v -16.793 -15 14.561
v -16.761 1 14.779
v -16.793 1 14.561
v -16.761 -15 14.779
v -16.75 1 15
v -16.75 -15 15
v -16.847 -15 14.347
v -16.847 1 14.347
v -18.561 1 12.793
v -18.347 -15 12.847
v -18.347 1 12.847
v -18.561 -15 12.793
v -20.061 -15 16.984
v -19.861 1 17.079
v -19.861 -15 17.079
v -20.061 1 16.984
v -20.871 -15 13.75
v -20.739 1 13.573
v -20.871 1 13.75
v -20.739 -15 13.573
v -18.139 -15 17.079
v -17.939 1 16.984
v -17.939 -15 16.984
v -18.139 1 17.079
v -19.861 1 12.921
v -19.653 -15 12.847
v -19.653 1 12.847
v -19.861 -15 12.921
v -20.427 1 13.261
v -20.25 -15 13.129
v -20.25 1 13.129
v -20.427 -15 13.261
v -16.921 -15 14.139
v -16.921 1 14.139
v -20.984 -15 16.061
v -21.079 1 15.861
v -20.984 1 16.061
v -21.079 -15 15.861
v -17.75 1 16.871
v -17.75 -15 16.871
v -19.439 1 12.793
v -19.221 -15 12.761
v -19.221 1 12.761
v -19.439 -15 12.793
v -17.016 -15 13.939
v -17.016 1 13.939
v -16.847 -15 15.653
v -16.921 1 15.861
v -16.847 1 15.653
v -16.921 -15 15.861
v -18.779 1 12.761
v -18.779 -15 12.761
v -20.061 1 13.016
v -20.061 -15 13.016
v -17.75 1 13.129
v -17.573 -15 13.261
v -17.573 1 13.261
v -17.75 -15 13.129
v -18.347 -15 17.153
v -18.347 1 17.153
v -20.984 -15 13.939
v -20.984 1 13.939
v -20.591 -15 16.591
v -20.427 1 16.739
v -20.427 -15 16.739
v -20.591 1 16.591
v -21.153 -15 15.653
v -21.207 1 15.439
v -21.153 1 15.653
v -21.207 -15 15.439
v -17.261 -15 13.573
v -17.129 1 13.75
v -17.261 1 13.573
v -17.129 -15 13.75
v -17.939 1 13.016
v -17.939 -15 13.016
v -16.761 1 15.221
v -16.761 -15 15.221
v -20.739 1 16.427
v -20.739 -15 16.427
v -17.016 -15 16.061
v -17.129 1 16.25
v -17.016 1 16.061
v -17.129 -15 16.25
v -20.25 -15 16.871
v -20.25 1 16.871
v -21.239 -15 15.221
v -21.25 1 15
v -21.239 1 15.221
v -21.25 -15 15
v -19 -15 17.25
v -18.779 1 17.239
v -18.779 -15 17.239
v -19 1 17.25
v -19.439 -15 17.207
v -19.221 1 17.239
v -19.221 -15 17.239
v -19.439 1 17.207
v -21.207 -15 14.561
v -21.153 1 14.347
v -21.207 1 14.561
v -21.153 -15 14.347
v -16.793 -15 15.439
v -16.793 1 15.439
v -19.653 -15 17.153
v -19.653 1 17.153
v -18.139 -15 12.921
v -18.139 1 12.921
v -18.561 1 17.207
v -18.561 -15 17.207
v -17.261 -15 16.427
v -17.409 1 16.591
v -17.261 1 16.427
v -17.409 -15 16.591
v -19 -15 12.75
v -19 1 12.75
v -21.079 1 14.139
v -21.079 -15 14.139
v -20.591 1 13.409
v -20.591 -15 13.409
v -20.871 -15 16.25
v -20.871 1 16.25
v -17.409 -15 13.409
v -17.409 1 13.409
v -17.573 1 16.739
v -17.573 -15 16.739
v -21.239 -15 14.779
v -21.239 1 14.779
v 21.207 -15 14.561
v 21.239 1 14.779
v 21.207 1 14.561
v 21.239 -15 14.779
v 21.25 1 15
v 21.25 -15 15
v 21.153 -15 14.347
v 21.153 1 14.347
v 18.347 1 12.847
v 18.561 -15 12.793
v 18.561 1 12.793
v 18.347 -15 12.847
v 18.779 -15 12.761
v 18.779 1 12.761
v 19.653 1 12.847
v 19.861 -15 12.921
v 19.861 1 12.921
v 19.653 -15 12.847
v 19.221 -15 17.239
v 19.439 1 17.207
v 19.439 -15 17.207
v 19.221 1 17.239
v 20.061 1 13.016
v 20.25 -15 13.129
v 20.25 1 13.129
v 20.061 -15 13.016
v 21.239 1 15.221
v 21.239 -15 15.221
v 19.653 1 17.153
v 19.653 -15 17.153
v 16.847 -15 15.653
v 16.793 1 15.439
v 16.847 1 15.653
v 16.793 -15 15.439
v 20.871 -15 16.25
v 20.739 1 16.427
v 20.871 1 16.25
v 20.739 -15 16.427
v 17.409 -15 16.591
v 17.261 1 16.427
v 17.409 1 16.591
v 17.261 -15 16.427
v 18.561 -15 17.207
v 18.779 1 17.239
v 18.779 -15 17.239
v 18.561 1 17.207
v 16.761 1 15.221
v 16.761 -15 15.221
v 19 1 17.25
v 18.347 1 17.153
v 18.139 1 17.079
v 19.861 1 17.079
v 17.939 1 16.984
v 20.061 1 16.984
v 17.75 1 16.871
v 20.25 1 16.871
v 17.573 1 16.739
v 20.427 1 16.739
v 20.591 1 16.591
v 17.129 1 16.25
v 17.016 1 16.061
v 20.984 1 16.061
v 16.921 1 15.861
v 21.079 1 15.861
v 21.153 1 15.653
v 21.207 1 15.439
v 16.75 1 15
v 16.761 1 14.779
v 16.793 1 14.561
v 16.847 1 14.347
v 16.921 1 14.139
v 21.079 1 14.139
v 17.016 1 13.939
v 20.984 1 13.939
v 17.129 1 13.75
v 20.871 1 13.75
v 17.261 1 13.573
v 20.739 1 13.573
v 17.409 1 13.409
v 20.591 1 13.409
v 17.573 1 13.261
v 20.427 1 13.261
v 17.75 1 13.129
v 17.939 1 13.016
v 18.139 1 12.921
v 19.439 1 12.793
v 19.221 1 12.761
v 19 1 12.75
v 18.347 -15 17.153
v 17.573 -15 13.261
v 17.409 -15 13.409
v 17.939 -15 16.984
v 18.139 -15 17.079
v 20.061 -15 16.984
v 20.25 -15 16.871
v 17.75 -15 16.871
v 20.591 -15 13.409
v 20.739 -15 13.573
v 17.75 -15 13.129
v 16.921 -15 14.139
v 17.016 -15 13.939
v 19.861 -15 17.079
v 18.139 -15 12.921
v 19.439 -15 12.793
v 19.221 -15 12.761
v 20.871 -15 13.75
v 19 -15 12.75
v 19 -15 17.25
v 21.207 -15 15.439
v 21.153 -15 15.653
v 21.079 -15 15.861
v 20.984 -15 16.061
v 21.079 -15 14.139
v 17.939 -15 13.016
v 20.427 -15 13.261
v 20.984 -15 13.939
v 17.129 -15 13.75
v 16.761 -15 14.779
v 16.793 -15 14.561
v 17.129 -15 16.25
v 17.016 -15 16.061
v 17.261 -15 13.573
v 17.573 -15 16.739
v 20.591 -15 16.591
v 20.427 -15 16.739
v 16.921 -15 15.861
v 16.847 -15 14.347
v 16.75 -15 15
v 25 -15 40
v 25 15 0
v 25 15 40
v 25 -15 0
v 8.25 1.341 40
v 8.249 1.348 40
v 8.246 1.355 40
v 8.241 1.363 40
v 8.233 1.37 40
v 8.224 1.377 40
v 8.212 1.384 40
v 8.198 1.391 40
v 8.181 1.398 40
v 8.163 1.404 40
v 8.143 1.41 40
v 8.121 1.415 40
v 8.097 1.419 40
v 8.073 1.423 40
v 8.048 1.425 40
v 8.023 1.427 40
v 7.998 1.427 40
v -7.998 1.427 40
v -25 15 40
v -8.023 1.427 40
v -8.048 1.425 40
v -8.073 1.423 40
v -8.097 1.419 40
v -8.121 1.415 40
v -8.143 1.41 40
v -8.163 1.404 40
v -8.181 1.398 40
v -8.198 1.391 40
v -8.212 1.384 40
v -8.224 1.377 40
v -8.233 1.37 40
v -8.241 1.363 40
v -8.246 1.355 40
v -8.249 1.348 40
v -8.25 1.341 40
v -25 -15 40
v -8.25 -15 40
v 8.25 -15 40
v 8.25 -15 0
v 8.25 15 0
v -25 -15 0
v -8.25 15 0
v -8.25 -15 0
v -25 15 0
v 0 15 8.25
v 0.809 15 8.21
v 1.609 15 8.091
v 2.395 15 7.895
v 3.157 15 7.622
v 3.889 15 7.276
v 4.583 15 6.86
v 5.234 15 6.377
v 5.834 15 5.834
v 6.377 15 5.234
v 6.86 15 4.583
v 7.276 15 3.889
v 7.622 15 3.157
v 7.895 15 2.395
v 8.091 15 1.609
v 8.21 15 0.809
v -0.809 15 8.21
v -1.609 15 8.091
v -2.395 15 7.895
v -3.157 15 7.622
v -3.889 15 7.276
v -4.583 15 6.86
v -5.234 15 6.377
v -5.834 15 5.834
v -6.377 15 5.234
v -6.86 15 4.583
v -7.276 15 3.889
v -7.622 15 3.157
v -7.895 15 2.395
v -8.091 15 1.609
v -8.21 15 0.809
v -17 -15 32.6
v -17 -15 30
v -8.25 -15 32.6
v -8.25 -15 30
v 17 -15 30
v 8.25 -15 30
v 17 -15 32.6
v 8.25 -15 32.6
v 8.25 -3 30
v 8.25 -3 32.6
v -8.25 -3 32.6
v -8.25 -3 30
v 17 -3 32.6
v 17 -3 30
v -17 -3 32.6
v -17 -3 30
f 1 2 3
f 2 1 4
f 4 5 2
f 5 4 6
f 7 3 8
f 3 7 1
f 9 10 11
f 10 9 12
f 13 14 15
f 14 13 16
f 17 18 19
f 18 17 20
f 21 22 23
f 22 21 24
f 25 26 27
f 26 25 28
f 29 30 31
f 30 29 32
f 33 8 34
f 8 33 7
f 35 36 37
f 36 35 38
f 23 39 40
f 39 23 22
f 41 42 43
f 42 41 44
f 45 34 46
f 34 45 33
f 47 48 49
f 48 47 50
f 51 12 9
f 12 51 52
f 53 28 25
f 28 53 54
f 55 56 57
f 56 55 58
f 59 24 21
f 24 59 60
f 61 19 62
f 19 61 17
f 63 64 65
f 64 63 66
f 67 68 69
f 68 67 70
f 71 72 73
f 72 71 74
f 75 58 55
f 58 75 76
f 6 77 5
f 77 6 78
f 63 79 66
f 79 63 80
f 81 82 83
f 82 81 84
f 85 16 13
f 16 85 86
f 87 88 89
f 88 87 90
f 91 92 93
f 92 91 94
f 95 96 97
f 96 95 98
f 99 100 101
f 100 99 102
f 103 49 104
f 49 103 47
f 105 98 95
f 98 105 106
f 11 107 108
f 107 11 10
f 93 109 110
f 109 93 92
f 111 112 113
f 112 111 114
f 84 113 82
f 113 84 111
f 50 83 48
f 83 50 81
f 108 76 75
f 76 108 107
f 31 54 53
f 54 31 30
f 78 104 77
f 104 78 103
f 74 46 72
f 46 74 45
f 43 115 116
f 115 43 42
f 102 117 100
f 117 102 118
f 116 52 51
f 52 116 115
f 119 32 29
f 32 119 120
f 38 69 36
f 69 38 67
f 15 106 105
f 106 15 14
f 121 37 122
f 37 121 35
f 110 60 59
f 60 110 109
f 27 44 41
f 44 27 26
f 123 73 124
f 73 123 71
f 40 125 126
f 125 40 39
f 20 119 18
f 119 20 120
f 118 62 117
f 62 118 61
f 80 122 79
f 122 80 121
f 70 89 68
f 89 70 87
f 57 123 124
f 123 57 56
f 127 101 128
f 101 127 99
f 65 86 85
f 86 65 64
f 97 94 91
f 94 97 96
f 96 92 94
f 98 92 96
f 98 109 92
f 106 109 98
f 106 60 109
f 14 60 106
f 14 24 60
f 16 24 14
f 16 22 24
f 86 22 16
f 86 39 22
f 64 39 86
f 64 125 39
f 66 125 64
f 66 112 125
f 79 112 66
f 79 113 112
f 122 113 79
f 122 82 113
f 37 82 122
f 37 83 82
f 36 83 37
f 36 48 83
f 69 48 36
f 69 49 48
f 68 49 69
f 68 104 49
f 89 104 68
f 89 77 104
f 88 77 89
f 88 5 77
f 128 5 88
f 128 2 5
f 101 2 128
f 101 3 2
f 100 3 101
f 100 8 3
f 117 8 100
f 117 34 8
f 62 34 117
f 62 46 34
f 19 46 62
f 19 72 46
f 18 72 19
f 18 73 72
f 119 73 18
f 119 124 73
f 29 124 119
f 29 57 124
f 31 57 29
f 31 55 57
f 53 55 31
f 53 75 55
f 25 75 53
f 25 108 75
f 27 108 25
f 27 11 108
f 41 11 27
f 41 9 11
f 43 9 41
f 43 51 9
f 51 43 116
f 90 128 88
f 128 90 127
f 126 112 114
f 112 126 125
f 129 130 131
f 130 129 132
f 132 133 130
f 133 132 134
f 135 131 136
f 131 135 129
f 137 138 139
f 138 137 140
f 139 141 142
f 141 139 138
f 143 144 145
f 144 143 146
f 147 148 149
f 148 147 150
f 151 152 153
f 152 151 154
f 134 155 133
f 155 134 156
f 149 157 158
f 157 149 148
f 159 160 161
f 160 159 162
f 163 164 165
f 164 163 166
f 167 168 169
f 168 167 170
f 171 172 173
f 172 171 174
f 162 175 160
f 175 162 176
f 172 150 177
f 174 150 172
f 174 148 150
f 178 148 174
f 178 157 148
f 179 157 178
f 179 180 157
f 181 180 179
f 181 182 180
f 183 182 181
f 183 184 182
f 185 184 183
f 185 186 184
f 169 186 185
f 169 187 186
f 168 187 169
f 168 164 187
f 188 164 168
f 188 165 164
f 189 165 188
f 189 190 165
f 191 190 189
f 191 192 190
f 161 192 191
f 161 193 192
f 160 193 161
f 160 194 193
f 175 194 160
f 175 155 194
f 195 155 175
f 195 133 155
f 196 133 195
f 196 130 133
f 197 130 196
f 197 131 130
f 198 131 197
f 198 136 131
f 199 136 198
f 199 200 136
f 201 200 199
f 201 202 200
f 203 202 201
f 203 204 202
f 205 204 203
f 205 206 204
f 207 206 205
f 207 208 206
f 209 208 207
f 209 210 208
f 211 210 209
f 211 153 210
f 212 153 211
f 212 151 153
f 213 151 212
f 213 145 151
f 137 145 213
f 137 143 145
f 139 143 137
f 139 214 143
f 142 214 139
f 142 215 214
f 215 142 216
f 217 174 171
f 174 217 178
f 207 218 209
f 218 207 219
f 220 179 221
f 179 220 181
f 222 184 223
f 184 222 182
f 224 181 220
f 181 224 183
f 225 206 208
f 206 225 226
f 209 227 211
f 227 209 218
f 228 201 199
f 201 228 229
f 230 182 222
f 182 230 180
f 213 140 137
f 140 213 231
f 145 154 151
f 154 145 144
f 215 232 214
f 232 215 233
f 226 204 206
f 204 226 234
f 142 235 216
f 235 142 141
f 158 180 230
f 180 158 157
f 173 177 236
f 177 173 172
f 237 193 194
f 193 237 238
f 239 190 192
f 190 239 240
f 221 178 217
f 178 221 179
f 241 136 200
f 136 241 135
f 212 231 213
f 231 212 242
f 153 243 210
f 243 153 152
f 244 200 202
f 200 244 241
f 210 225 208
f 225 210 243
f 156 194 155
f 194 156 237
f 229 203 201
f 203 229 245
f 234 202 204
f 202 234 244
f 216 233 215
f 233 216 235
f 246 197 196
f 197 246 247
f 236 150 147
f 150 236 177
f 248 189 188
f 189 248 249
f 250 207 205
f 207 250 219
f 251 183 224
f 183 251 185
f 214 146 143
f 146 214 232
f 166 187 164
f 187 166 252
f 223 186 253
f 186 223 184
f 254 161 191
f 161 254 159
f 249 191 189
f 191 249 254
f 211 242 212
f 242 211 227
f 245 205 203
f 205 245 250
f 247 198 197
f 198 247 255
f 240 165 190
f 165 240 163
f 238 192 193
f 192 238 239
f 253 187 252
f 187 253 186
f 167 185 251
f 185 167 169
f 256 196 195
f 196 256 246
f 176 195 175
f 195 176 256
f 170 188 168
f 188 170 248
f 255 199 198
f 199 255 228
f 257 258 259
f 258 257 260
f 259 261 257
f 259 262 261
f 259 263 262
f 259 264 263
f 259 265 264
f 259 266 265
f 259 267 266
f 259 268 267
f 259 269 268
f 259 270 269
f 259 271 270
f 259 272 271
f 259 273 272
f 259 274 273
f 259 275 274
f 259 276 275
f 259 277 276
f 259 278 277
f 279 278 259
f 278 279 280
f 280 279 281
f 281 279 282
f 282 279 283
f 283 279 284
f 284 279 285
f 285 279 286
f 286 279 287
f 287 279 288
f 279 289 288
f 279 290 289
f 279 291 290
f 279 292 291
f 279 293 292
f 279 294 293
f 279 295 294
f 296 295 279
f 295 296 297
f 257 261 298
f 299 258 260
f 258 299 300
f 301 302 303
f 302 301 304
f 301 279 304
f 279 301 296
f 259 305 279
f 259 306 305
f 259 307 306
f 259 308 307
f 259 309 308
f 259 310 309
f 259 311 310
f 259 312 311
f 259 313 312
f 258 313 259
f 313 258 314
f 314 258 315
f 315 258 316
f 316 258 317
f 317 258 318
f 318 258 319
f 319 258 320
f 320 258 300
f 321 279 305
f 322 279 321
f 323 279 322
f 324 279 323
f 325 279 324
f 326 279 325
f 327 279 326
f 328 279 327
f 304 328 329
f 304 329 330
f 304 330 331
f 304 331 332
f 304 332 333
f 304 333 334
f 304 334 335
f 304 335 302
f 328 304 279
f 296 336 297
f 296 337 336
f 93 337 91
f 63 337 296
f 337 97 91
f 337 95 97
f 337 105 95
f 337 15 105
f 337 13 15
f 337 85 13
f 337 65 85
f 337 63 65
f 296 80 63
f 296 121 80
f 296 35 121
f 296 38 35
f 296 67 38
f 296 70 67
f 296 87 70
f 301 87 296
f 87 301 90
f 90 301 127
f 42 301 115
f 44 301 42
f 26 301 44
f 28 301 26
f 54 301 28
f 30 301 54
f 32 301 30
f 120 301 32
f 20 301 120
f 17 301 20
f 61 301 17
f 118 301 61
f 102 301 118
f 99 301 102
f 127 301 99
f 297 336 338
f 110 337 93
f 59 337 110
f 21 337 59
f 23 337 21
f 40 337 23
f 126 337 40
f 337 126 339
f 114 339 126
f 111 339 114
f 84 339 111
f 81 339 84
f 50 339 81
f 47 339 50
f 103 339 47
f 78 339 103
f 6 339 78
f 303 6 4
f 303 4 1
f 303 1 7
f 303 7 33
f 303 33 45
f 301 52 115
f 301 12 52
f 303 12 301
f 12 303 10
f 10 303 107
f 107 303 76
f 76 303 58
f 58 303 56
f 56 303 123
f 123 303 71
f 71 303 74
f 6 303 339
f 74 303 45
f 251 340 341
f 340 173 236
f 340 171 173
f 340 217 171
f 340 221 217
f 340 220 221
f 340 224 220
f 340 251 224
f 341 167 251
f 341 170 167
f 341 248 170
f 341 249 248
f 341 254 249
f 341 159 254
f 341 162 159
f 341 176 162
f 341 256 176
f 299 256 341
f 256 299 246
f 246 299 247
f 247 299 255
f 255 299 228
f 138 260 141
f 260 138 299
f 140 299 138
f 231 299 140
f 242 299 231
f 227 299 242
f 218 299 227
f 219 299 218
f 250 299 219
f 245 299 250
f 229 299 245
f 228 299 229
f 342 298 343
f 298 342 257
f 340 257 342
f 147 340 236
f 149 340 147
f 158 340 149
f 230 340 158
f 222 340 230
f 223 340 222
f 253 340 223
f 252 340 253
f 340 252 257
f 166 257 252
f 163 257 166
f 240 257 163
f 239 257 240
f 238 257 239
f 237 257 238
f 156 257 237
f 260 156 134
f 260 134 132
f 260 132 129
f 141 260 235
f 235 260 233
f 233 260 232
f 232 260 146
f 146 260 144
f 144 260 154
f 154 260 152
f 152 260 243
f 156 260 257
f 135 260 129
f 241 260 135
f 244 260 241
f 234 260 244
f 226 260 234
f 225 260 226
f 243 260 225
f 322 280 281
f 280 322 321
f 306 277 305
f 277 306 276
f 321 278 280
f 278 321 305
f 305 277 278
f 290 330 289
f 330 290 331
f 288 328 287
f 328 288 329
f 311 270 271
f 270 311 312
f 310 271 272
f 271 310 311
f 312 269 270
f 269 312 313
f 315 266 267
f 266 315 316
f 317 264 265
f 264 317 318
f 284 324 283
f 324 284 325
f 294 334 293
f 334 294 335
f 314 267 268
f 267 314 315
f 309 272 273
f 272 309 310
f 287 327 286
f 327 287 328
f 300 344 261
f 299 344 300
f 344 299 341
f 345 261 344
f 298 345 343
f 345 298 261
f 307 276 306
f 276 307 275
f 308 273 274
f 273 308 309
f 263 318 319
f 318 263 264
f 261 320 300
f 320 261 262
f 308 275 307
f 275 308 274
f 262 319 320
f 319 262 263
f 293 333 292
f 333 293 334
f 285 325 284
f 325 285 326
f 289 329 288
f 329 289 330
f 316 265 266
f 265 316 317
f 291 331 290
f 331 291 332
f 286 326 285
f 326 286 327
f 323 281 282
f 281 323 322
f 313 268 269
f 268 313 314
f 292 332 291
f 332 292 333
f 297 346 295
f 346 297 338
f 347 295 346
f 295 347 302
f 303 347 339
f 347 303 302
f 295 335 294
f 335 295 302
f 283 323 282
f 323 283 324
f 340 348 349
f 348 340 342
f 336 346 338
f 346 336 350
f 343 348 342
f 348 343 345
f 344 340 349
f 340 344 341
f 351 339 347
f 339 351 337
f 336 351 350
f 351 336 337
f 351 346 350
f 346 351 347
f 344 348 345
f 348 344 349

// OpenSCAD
// Wall-mounted syringe holder for 10mL syringe
// Corrected centering and geometry to match exact specifications.

// --- Dimensions ---
block_w = 50.0;       // Width (X)
block_d = 30.0;       // Depth (Y)
block_h = 40.0;       // Height (Z)

barrel_dia = 16.5;    // Diameter of the syringe barrel channel
barrel_rad = barrel_dia / 2;

flange_w = 34.0;      // Width of the flange slot (X)
flange_h = 2.6;       // Height of the flange slot (Z)
flange_z_start = 30.0; // Bottom of the flange slot
flange_y_end = 11.0;  // How far back the slot goes (Y)

screw_hole_d = 4.5;   // Diameter for M4 screws
screw_hole_x = 19.0;  // Offset from center for screw holes (X)
screw_hole_z = 15.0;  // Height of screw holes (Z)

$fn = 64;

// --- Modeling ---

// The main block
difference() {
    // Base block centered on XY, sitting on Z=0
    // To center on Y, we translate by -block_d/2
    translate([-block_w/2, -block_d/2, 0])
        cube([block_w, block_d, block_h]);

    // 1. Syringe Barrel Channel
    // Back end is a half-circle of 8.25mm radius centered at x=0, y=15 (back face)
    // Straight sides run forward to the front face (y=-15)
    // We use a hull of a half-cylinder at the back and a rectangle at the front
    hull() {
        // Back half-circle at y = 15 (the back face)
        // We use a cylinder and rotate it to create the half-circle profile
        translate([0, block_d/2, 0])
            rotate([90, 0, 0])
                cylinder(h = barrel_dia, d = barrel_dia);
        
        // Front rectangle to ensure it cuts through the front face (y=-15)
        translate([-barrel_rad, -block_d - 1, -1])
            cube([barrel_dia, block_d + 2, block_h + 2]);
    }

    // 2. Flange Slot
    // Cut from the front face (y = -15) back to y = 11
    // X is centered, Z is 30 to 32.6
    translate([-flange_w/2, -block_d - 1, flange_z_start])
        cube([flange_w, (block_d/2 + 11) + 2, flange_h]);

    // 3. Screw Holes
    // Two M4 holes through the block along Y axis at x = +/- 19, z = 15
    for (sx = [-screw_hole_x, screw_hole_x]) {
        translate([sx, -block_d - 1, screw_hole_z])
            rotate([-90, 0, 0])
                cylinder(h = block_d + 2, d = screw_hole_d);
    }
}
